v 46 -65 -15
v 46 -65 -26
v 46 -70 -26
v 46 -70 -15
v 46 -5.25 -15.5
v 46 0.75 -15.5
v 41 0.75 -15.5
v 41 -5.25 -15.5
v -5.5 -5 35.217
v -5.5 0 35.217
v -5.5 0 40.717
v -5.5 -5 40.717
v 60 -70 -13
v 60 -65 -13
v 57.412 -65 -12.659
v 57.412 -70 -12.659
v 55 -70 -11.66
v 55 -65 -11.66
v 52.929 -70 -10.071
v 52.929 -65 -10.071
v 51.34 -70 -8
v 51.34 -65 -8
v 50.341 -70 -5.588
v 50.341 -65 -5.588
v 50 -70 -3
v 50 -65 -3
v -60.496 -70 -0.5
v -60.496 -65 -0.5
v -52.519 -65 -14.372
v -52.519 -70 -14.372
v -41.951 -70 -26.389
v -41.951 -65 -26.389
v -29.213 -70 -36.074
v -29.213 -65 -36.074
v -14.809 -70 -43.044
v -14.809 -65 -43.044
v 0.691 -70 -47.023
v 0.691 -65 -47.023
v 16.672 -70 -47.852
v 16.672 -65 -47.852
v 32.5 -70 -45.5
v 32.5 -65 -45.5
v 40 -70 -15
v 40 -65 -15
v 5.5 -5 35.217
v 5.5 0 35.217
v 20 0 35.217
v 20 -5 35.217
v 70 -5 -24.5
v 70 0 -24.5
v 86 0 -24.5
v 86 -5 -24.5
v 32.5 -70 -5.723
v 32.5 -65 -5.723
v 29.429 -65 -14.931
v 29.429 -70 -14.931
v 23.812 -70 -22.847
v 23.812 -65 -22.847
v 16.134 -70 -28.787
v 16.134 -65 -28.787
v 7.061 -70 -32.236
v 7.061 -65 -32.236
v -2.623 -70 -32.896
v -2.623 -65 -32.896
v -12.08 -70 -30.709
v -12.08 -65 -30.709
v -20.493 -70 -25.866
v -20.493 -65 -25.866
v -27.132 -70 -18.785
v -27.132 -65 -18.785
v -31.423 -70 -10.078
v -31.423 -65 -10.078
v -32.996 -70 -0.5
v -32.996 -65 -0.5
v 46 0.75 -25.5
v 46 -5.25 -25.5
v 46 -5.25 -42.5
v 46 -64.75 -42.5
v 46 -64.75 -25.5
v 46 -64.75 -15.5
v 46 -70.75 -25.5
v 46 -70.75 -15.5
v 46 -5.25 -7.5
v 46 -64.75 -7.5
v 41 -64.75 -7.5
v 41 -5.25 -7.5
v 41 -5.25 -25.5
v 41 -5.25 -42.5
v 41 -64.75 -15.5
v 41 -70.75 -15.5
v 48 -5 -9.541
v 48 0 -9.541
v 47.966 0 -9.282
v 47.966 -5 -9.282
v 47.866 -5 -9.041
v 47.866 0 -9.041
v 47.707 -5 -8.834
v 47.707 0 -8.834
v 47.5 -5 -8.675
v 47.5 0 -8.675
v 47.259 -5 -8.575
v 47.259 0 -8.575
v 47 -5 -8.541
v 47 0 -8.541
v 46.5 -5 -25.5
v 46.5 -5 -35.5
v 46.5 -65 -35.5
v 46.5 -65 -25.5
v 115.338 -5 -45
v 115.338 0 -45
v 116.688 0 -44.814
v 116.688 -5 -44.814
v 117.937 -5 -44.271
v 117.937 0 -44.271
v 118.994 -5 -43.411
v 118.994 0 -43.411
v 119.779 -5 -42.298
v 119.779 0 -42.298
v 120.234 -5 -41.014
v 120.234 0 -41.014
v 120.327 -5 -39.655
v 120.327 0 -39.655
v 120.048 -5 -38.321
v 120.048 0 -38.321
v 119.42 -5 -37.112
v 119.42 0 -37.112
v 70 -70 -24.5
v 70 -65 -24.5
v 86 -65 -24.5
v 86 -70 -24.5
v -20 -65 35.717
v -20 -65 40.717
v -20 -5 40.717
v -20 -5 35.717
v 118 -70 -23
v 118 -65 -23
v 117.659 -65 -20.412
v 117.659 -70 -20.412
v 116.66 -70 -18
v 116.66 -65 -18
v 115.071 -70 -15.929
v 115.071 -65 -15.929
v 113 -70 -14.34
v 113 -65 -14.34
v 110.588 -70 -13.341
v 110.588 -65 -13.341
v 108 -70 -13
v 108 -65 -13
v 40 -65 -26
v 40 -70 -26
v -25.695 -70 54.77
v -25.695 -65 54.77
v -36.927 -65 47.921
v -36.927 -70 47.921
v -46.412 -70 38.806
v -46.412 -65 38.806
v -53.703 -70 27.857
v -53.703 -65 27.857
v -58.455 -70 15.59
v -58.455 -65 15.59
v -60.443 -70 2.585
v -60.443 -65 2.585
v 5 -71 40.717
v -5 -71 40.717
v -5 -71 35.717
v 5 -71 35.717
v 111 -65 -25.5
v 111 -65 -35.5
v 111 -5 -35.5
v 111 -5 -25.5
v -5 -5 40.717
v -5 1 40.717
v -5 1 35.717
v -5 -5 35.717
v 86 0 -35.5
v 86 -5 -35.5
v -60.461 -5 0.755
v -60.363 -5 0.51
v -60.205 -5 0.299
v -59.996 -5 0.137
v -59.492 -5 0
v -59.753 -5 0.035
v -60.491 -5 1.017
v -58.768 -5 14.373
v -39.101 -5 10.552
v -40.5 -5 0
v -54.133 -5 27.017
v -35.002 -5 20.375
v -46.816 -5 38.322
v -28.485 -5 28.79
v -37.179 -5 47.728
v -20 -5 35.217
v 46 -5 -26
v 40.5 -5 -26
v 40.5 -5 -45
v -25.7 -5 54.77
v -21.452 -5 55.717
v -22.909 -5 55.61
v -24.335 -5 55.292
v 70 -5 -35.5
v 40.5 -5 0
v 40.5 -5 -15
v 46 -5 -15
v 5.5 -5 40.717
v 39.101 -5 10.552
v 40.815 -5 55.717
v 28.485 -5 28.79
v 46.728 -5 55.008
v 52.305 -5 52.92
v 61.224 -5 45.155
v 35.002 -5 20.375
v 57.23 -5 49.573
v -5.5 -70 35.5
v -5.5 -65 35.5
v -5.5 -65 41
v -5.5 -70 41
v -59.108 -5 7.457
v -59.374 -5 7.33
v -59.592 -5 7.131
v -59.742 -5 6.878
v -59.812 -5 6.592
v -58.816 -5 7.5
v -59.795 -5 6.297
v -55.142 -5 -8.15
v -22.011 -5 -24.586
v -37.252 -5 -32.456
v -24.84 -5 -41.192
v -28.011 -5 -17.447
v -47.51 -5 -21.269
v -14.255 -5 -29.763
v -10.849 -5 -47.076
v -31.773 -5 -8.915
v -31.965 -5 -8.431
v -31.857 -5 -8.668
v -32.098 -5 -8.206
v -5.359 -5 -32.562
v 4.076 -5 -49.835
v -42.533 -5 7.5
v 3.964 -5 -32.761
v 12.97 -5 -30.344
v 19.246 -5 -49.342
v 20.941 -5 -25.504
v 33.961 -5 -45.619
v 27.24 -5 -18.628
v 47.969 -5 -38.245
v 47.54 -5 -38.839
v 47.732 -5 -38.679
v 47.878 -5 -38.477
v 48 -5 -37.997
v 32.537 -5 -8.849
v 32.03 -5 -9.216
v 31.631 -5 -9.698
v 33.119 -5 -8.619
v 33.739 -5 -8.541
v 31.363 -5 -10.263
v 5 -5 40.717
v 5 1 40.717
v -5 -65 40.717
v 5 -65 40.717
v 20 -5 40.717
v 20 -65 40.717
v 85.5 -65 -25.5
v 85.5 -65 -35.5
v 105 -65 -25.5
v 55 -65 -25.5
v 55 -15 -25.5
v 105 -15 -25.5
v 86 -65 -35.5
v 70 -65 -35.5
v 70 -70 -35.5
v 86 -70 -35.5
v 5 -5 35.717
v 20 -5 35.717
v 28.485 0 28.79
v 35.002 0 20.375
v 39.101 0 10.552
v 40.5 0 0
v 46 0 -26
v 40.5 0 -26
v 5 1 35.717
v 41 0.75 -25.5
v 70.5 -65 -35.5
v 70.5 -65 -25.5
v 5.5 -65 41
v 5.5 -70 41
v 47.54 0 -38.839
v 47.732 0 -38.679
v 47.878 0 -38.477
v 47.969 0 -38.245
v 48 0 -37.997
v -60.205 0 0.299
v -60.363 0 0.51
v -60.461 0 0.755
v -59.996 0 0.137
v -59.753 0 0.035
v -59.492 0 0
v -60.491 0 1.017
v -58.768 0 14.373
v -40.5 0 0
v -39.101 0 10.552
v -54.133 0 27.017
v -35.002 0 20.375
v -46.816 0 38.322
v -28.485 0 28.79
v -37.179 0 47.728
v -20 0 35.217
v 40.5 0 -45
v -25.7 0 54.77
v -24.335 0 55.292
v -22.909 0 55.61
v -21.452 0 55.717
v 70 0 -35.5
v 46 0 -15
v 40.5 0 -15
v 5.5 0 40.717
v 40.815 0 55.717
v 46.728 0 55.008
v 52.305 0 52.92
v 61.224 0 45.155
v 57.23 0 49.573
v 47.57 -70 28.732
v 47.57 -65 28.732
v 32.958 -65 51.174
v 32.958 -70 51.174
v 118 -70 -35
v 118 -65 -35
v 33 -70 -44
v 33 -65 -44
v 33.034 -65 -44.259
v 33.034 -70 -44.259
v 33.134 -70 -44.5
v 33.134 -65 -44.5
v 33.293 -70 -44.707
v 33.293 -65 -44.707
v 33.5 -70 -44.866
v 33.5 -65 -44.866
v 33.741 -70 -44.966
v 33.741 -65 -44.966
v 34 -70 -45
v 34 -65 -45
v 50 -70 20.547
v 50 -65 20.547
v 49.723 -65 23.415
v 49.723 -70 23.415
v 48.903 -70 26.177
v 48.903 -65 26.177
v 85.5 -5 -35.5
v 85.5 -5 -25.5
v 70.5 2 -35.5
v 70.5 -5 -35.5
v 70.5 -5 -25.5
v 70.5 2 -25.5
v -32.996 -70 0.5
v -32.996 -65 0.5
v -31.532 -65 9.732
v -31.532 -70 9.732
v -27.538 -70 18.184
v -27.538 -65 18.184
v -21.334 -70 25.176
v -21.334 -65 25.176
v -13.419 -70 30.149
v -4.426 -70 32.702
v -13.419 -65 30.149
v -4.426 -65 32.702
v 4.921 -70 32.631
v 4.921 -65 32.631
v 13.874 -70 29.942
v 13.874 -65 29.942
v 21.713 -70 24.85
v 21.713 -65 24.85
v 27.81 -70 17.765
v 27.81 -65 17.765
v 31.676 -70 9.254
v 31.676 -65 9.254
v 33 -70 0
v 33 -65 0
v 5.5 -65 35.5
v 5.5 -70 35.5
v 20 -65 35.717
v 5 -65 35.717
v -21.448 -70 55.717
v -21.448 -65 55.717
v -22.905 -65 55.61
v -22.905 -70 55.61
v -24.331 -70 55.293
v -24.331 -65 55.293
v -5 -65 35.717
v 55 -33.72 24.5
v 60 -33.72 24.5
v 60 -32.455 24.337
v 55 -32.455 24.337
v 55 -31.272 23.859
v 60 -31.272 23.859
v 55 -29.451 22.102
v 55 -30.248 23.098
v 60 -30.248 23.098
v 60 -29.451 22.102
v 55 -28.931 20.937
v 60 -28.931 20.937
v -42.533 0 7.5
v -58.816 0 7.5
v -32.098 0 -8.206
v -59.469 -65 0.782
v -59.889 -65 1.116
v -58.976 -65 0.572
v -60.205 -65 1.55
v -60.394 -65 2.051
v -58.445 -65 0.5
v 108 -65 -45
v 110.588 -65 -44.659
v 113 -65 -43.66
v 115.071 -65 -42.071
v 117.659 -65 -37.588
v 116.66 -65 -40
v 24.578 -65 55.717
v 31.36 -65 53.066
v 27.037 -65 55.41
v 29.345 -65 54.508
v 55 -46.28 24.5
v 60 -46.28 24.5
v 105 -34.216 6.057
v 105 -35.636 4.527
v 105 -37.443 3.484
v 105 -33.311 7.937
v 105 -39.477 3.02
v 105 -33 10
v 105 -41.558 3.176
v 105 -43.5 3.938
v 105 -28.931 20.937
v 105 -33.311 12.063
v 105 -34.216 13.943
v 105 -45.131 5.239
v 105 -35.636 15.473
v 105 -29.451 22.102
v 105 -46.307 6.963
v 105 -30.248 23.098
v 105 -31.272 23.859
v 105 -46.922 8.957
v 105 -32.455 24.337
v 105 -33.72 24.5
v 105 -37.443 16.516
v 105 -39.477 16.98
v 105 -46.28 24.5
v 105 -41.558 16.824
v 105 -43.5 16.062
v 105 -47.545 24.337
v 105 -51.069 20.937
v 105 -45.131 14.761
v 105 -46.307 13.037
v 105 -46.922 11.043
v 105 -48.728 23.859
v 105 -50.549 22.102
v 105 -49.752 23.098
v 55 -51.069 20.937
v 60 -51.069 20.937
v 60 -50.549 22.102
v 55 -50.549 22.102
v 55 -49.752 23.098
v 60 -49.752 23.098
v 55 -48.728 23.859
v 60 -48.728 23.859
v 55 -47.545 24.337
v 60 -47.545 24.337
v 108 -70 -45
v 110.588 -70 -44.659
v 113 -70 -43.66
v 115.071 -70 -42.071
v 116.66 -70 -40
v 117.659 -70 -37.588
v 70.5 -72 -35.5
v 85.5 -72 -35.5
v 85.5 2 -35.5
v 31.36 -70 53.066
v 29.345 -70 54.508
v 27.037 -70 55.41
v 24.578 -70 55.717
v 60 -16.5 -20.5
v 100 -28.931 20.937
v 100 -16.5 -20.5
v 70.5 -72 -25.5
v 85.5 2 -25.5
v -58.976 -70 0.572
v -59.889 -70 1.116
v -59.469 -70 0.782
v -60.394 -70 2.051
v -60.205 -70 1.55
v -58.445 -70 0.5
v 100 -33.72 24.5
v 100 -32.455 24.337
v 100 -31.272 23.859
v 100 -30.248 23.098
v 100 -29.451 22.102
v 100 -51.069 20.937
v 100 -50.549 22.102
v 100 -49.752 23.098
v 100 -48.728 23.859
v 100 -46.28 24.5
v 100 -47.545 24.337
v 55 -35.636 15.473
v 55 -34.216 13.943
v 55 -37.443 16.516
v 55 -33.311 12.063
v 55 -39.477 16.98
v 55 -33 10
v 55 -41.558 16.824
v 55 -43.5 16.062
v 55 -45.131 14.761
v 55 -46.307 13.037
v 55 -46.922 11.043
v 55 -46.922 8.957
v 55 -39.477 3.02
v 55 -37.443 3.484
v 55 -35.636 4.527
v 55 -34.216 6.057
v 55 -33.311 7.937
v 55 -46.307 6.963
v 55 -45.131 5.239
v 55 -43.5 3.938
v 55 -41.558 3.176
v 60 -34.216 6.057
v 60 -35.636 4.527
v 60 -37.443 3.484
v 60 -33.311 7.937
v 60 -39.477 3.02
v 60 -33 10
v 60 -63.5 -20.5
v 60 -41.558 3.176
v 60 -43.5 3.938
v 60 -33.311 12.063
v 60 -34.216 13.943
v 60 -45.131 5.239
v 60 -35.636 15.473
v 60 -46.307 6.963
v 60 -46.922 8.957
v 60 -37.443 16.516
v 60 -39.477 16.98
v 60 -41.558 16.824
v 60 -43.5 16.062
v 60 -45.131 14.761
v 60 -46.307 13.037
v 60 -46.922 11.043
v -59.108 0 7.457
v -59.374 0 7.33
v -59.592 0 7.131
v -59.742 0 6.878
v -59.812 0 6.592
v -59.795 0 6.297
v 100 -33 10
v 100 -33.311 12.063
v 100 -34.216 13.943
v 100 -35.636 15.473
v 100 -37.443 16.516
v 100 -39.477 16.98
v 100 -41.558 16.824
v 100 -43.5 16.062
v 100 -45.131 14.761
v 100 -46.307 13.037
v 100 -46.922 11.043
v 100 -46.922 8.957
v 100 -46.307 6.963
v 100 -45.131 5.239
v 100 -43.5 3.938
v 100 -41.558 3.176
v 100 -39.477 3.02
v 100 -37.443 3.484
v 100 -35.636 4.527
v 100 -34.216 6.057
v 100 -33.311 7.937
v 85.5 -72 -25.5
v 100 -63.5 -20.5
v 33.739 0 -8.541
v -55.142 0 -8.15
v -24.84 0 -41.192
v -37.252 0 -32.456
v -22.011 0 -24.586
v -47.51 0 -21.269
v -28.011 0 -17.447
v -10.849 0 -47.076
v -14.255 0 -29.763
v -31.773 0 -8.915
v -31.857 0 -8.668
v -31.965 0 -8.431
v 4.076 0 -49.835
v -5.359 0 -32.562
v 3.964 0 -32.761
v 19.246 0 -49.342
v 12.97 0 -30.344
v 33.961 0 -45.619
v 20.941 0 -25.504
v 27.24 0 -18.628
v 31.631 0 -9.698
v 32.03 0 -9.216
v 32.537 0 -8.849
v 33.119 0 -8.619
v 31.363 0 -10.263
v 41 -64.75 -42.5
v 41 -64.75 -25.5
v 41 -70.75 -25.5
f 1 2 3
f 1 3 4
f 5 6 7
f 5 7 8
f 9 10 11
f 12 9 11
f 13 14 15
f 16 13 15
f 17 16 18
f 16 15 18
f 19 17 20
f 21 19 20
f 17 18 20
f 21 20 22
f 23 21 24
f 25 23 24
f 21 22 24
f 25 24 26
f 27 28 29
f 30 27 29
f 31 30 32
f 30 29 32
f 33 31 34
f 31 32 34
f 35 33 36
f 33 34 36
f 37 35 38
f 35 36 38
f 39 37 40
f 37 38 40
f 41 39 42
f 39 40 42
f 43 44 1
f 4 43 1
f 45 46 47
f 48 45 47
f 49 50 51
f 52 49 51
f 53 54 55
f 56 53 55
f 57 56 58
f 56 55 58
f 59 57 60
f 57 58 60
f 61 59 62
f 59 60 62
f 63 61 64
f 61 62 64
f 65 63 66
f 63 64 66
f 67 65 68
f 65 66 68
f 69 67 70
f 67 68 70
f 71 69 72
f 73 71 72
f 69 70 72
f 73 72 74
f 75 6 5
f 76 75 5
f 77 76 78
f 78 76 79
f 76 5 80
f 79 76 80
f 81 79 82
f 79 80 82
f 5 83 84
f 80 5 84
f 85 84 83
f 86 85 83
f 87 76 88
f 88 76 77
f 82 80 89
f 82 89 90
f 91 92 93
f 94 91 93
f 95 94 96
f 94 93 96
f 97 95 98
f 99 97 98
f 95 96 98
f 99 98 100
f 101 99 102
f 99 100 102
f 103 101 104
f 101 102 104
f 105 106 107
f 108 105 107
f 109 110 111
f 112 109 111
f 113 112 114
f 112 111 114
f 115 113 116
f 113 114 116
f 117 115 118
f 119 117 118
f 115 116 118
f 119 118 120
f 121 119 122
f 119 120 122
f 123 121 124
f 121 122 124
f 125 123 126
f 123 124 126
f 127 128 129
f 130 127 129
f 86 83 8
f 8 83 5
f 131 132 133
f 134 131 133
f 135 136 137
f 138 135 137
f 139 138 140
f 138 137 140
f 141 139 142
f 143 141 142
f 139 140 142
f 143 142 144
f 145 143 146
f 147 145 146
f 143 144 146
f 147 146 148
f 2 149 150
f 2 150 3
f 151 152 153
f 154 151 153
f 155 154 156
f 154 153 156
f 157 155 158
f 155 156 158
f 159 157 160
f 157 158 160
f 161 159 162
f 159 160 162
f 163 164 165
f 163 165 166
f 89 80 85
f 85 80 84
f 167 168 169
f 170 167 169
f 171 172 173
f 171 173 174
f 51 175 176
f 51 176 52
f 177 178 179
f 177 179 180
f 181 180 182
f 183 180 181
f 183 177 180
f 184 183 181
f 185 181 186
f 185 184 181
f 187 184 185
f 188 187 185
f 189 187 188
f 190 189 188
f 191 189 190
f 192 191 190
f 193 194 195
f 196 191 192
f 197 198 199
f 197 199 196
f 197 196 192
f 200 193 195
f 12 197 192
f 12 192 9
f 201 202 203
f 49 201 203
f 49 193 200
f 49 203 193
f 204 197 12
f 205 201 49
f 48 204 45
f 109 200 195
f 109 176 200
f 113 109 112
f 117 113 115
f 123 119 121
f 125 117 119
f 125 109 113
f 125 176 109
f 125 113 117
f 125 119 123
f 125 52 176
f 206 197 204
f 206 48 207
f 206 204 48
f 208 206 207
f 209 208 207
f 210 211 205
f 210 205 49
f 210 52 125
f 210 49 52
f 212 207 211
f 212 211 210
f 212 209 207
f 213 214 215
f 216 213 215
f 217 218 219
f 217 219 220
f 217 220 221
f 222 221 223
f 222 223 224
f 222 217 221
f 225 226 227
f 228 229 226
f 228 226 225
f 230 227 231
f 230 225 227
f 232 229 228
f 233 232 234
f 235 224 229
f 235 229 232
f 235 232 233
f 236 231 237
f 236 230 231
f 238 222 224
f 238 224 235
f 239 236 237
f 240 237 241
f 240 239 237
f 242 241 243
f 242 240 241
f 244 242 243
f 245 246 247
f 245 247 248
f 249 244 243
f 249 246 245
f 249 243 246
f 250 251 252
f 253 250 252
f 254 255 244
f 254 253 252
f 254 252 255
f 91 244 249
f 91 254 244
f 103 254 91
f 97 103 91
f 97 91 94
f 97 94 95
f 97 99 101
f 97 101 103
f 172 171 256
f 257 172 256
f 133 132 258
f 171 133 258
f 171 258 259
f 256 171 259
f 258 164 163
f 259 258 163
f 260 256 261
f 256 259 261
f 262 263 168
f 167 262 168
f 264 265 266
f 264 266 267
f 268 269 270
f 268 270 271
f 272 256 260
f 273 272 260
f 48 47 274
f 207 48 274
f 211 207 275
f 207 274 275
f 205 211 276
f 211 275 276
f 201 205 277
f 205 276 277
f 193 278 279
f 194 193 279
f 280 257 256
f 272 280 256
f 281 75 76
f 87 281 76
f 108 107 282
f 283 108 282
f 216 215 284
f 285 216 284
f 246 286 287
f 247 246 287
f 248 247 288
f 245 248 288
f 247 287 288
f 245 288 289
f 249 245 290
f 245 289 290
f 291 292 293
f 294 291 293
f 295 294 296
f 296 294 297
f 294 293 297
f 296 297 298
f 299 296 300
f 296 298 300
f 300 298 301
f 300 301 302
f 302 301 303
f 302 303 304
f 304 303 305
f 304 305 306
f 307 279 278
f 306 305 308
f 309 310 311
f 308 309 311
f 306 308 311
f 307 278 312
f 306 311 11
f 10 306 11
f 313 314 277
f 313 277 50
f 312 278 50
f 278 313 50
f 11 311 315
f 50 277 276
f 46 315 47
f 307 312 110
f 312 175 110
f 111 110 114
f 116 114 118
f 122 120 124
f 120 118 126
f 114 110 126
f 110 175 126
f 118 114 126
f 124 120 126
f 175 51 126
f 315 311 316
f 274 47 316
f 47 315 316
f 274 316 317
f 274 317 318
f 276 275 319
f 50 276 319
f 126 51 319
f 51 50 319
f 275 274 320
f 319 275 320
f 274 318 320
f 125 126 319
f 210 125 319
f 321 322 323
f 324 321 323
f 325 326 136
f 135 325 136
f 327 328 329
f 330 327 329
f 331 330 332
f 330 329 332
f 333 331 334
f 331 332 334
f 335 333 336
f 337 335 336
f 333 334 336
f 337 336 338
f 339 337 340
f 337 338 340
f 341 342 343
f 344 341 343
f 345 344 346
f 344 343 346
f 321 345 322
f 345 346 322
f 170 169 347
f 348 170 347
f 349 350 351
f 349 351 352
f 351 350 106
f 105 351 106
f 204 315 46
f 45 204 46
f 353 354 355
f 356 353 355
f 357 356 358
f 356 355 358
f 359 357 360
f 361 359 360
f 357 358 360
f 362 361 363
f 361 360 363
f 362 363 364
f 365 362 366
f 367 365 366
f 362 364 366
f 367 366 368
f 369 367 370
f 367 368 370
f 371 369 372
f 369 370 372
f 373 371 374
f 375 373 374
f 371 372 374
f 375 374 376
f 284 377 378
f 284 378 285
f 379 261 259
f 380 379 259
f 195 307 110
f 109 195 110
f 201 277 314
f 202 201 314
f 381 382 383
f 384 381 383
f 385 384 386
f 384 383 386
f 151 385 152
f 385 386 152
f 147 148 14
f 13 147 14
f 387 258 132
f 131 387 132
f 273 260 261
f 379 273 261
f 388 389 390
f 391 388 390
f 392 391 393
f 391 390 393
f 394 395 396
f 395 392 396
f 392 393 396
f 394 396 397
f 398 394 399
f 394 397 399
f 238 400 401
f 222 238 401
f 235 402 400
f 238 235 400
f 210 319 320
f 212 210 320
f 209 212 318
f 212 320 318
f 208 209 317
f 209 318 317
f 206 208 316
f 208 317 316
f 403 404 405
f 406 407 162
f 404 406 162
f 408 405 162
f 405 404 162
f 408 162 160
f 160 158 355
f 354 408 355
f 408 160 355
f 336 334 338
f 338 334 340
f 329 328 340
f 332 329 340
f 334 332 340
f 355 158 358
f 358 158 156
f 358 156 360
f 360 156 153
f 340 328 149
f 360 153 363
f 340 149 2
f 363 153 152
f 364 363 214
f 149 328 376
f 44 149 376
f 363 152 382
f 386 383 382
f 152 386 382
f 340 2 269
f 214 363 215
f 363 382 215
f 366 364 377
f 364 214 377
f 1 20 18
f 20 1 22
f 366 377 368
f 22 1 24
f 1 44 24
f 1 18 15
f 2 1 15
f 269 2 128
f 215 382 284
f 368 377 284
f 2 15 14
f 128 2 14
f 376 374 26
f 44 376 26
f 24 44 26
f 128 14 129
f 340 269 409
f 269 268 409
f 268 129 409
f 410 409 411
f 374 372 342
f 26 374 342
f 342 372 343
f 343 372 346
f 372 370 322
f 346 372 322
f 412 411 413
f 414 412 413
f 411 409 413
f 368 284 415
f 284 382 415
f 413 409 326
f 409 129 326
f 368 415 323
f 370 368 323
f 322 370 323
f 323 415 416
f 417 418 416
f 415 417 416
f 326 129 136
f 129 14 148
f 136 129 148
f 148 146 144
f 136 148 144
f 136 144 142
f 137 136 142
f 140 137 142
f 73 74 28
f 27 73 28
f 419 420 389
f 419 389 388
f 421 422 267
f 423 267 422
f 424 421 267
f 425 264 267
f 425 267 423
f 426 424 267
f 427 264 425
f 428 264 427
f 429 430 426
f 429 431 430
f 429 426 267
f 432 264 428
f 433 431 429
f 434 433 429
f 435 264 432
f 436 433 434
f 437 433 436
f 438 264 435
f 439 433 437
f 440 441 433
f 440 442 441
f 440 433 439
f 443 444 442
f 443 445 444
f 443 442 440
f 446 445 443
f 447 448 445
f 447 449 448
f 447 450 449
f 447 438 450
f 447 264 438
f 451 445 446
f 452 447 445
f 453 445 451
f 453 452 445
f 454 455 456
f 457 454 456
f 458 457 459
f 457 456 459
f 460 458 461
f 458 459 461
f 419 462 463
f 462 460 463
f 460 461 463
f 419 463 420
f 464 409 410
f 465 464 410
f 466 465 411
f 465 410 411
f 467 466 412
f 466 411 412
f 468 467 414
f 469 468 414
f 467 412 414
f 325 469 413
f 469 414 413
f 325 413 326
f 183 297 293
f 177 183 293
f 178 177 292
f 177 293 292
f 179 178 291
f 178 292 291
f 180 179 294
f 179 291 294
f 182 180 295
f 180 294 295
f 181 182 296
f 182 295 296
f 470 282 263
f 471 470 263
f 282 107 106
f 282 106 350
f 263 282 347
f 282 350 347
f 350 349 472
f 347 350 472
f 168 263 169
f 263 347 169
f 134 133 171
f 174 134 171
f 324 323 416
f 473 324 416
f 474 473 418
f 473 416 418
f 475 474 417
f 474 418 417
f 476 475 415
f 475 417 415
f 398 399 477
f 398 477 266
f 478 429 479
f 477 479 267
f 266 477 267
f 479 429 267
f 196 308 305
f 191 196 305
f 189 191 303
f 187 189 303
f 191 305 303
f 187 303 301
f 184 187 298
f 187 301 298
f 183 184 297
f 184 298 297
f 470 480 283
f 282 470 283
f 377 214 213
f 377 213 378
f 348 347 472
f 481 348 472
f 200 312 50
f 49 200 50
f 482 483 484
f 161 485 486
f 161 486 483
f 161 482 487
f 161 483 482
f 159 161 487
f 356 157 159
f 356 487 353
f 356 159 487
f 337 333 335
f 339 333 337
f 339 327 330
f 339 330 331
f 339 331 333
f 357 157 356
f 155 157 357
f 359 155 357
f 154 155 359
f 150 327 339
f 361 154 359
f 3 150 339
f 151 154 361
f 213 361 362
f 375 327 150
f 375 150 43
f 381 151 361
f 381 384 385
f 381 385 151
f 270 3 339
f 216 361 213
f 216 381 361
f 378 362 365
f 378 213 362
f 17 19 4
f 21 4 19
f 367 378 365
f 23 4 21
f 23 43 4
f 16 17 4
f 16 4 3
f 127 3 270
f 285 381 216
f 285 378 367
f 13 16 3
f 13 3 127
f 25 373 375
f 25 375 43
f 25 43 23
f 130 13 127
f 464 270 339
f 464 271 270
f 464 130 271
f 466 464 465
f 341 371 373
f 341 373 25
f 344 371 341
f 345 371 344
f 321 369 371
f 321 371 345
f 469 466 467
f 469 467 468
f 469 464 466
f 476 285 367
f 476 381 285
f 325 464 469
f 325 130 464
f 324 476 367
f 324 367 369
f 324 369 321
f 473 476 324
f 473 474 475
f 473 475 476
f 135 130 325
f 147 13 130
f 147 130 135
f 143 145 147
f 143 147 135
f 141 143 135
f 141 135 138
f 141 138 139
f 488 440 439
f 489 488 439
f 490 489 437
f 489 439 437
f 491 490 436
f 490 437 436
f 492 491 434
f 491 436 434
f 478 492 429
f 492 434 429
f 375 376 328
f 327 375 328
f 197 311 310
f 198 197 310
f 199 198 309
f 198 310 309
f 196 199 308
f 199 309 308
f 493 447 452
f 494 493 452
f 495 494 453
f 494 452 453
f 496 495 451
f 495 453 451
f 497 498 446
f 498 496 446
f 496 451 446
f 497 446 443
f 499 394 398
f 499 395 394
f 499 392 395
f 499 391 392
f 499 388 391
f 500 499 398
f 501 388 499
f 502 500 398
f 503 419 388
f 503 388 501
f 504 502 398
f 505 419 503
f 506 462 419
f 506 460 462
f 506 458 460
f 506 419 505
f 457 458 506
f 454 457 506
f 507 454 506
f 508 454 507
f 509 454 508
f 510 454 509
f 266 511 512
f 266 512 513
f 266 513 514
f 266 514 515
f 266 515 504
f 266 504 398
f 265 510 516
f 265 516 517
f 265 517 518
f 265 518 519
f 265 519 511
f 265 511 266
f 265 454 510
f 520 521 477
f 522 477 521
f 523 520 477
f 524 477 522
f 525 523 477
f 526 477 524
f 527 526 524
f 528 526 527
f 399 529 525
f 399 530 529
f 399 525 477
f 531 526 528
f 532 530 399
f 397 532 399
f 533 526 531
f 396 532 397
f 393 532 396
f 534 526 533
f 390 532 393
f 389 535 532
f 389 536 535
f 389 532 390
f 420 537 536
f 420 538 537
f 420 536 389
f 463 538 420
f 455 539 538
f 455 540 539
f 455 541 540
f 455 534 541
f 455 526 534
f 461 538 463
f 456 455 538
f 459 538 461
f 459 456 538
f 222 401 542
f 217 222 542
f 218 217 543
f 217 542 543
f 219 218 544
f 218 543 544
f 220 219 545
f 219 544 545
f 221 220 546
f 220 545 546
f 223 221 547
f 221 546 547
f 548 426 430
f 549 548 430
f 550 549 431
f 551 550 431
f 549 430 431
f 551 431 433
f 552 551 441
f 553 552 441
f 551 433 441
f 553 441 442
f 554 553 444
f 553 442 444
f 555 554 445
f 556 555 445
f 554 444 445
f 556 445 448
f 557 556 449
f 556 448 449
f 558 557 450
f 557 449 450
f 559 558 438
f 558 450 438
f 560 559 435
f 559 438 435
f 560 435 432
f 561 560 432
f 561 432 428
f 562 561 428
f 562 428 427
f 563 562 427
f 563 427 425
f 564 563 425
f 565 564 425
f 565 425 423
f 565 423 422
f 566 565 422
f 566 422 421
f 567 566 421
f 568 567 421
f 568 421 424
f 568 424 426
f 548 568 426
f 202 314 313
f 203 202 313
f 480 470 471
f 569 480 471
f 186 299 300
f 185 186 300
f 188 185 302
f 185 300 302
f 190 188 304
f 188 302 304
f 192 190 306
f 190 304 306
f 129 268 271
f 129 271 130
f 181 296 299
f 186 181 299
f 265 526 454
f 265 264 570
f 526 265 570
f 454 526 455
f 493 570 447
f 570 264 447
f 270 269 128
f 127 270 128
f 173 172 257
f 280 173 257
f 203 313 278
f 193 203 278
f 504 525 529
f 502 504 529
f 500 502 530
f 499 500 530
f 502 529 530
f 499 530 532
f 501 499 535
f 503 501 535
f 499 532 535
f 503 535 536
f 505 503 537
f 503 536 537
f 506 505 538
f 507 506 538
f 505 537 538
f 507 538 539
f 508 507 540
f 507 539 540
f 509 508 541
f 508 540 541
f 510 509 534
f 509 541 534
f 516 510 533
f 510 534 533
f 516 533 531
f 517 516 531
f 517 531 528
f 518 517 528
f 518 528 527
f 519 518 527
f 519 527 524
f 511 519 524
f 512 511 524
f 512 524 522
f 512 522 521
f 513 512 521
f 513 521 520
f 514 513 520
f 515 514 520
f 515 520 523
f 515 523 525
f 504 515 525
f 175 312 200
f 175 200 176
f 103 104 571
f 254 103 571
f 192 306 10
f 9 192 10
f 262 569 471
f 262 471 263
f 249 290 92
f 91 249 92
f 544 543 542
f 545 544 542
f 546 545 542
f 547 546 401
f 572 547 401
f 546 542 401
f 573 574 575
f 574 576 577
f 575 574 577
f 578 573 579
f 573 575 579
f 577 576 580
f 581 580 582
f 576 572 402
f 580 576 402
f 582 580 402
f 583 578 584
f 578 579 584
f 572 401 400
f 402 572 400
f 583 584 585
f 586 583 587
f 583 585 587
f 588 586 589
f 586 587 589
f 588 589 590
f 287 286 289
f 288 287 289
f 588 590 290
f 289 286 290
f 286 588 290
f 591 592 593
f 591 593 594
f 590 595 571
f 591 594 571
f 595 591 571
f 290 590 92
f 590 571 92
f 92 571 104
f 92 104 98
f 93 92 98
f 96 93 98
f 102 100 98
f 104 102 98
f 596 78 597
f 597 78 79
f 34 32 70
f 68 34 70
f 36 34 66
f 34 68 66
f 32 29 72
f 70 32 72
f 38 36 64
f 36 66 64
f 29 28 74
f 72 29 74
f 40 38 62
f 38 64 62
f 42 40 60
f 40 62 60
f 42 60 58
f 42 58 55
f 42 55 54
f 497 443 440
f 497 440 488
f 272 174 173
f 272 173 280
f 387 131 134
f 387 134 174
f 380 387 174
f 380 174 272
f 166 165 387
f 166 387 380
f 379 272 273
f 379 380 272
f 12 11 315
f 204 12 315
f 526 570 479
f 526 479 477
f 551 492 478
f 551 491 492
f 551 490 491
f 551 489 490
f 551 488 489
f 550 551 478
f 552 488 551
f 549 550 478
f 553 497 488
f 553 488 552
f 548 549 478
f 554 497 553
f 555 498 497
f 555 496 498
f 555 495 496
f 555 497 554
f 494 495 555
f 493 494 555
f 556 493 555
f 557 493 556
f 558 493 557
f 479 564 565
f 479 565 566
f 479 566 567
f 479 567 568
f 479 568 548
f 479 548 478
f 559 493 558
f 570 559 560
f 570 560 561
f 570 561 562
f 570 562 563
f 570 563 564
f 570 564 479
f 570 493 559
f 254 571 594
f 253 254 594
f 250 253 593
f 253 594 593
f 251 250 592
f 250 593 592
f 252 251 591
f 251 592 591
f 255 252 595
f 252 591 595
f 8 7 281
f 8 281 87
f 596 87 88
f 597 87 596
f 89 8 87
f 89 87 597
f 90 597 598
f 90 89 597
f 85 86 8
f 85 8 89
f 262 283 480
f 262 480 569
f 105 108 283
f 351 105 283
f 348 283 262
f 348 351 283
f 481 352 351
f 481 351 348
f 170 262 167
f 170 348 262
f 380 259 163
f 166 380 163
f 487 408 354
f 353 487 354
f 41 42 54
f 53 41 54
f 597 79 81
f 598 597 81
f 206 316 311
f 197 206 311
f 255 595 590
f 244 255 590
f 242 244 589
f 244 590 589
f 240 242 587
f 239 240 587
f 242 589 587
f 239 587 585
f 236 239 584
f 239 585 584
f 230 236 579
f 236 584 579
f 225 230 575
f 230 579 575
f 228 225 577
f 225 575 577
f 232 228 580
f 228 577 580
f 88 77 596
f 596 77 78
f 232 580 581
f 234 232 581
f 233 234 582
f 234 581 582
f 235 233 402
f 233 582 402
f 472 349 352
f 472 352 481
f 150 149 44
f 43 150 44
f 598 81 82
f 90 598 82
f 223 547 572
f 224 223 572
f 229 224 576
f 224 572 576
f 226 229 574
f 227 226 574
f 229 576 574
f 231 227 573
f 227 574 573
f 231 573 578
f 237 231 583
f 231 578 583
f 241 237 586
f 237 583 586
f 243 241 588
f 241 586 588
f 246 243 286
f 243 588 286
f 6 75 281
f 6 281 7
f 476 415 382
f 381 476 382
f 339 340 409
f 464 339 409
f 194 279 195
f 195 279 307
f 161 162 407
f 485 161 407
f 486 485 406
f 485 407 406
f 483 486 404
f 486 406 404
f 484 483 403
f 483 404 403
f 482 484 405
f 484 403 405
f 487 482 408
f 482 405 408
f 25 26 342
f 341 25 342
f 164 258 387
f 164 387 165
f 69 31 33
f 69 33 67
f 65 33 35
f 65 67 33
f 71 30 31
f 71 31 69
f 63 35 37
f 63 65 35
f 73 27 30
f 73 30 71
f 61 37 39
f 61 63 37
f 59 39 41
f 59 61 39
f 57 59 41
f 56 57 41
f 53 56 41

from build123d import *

# Parameters (mm, degrees)
F0_W      = 16
F0_H      = 11
F1_DEPTH  = 5
F3_DEPTH  = 5
F4_W      = 15
F4_H      = 7
F5_DEPTH  = 10
F7_DEPTH  = 50
F8_R      = 7
F9_DEPTH  = 602
F10_W     = 16
F10_H     = 11
F10_W_2   = 6
F10_W_3   = 11
F10_H_2   = 5.5
F11_DEPTH = 5
F12_W     = 10
F12_H     = 6
F13_DEPTH = 5
F14_W     = 6
F14_H     = 10
F15_DEPTH = 5


with BuildPart() as f1:
    # F0 (on Front) → F1 (new body)
    with BuildSketch(Plane.XZ):
        with BuildLine():
            ThreePointArc((-40.5, 0), (-35.0017856687, 20.3746165608), (-20, 35.2171833059))
            Line((-20, 35.2171833059), (-5.5, 35.2171833059))
            Line((-5.5, 35.2171833059), (-5.5, 40.7171833059))
            Line((-5.5, 40.7171833059), (5.5, 40.7171833059))
            Line((5.5, 40.7171833059), (5.5, 35.2171833059))
            Line((5.5, 35.2171833059), (20, 35.2171833059))
            ThreePointArc((20, 35.2171833059), (35.0017856687, 20.3746165608), (40.5, 0))
            Line((40.5, 0), (40.5, -15))
            Line((40.5, -15), (46, -15))
            Line((46, -15), (46, -26))
            Line((46, -26), (40.5, -26))
            Line((40.5, -26), (40.5, -45))
            Line((40.5, -45), (115.3384250636, -45))
            ThreePointArc((115.3384250636, -45), (119.7790192257, -42.2980695132), (119.4203426893, -37.1124493949))
            Line((119.4203426893, -37.1124493949), (61.2243521745, 45.1549363311))
            ThreePointArc((61.2243521745, 45.1549363311), (52.3051116117, 52.9201541165), (40.8147640458, 55.7171833059))
            Line((40.8147640458, 55.7171833059), (-21.4520197319, 55.7171833059))
            ThreePointArc((-21.4520197319, 55.7171833059), (-23.6281314187, 55.477538726), (-25.6999444312, 54.7700908912))
            ThreePointArc((-25.6999444312, 54.7700908912), (-50.7896959548, 32.8733445944), (-60.4914548022, 1.0168067227))
            ThreePointArc((-60.4914548022, 1.0168067227), (-60.2046201411, 0.2988604713), (-59.4915960452, 0))
            Line((-59.4915960452, 0), (-40.5, 0))
        make_face()
        with Locations((78, -30)):
            Rectangle(F0_W, F0_H, mode=Mode.SUBTRACT)
    extrude(amount=F1_DEPTH)


with BuildPart() as f3:
    # F2 (on Front) → F3 (new body)
    with BuildSketch(Plane.XZ):
        with BuildLine():
            ThreePointArc((31.3633663202, -10.2634912709), (-0.7048926371, -32.9924707527), (-31.7731104155, -8.9145641802))
            ThreePointArc((-31.7731104155, -8.9145641802), (-31.9077359339, -8.5477633127), (-32.0978693881, -8.2064186537))
            Line((-32.0978693881, -8.2064186537), (-42.5333240792, 7.5))
            Line((-42.5333240792, 7.5), (-58.8162039998, 7.5))
            ThreePointArc((-58.8162039998, 7.5), (-59.5916175254, 7.1314537705), (-59.7954795887, 6.2974677287))
            ThreePointArc((-59.7954795887, 6.2974677287), (-18.0031476506, -44.5111244838), (47.5402409783, -38.8387124322))
            ThreePointArc((47.5402409783, -38.8387124322), (47.8775650911, -38.4766595898), (48, -37.9972020725))
            Line((48, -37.9972020725), (48, -9.5410284884))
            ThreePointArc((48, -9.5410284884), (47.7071067812, -8.8339217072), (47, -8.5410284884))
            Line((47, -8.5410284884), (33.7393789202, -8.5410284884))
            ThreePointArc((33.7393789202, -8.5410284884), (32.2720417135, -9.016943134), (31.3633663202, -10.2634912709))
        make_face()
    extrude(amount=F3_DEPTH)


with BuildPart() as f5:
    # F4 (on face) → F5 (new body)
    with BuildSketch(Plane.XY.offset(-35.5)):
        Polygon((70.5, -5), (46.5, -5), (46.5, -65), (70.5, -65), (85.5, -65), (111, -65), (111, -5), (85.5, -5), align=None)
        with Locations((78, -1.5)):
            Rectangle(F4_W, F4_H)
        with Locations((78, -68.5)):
            Rectangle(F4_W, F4_H)
    extrude(amount=F5_DEPTH)


with BuildPart() as f7:
    # F6 (on face) → F7 (new body)
    with BuildSketch(Plane.XZ.offset(65)):
        Polygon((60, -20.5), (60, 24.5), (55, 24.5), (55, -25.5), (105, -25.5), (105, 24.5), (100, 24.5), (100, -20.5), align=None)
    extrude(amount=-F7_DEPTH)

    # F8 (on face) → F9 (cut)
    with BuildSketch(Plane.YZ.offset(105)):
        with Locations((-40, 10)):
            Circle(F8_R)
        with BuildLine():
            Line((-15, 24.5), (-33.7201532545, 24.5))
            ThreePointArc((-33.7201532545, 24.5), (-30.7355006063, 23.5114646414), (-28.9310218283, 20.9367394278))
            Line((-28.9310218283, 20.9367394278), (-15, -25.5))
            Line((-15, -25.5), (-15, 24.5))
        make_face()
        with BuildLine():
            ThreePointArc((-51.0689781717, 20.9367394278), (-49.2644993937, 23.5114646414), (-46.2798467455, 24.5))
            Line((-46.2798467455, 24.5), (-65, 24.5))
            Line((-65, 24.5), (-65, -25.5))
            Line((-65, -25.5), (-51.0689781717, 20.9367394278))
        make_face()
    extrude(amount=-F9_DEPTH, mode=Mode.SUBTRACT)


with BuildPart() as f11:
    # F10 (on face) → F11 (new body)
    with BuildSketch(Plane.XZ.offset(65)):
        with BuildLine():
            ThreePointArc((-32.9962119038, 0.5), (0.2500071747, 32.9990529624), (33, 0))
            Line((33, 0), (33, -44))
            ThreePointArc((33, -44), (33.2928932188, -44.7071067812), (34, -45))
            Line((34, -45), (108, -45))
            ThreePointArc((108, -45), (115.0710678119, -42.0710678119), (118, -35))
            Line((118, -35), (118, -23))
            ThreePointArc((118, -23), (115.0710678119, -15.9289321881), (108, -13))
            Line((108, -13), (60, -13))
            ThreePointArc((60, -13), (52.9289321881, -10.0710678119), (50, -3))
            Line((50, -3), (50, 0.018009717))
            Line((50, 0.018009717), (50, 20.5470842988))
            ThreePointArc((50, 20.5470842988), (49.3797577347, 24.8158742319), (47.5703243343, 28.7316396398))
            Line((47.5703243343, 28.7316396398), (32.9583635501, 51.1735535332))
            ThreePointArc((32.9583635501, 51.1735535332), (29.3445032584, 54.5081929826), (24.5781473272, 55.7171833059))
            Line((24.5781473272, 55.7171833059), (-21.4479659412, 55.7171833059))
            ThreePointArc((-21.4479659412, 55.7171833059), (-23.6237229696, 55.4776177918), (-25.6952327278, 54.7703995766))
            ThreePointArc((-25.6952327278, 54.7703995766), (-50.3563868625, 33.5302245275), (-60.4430060978, 2.5854726013))
            ThreePointArc((-60.4430060978, 2.5854726013), (-59.8889498708, 1.116335518), (-58.4448333239, 0.5))
            Line((-58.4448333239, 0.5), (-32.9962119038, 0.5))
        make_face()
        with Locations((78, -30)):
            Rectangle(F10_W, F10_H, mode=Mode.SUBTRACT)
        with Locations((43, -20.5)):
            Rectangle(F10_W_2, F10_H, mode=Mode.SUBTRACT)
        with Locations((0, 38.25)):
            Rectangle(F10_W_3, F10_H_2, mode=Mode.SUBTRACT)
    extrude(amount=F11_DEPTH)


with BuildPart() as f11b:
    # F10 (on face) → F11, piece 2 (new body)
    with BuildSketch(Plane.XZ.offset(65)):
        with BuildLine():
            ThreePointArc((32.5, -5.7227615711), (-2.6231405167, -32.8955792445), (-32.9962119038, -0.5))
            Line((-32.9962119038, -0.5), (-60.4962119038, -0.5))
            ThreePointArc((-60.4962119038, -0.5), (-22.1847321825, -39.9183383937), (32.5, -45.5))
            Line((32.5, -45.5), (32.5, -5.7227615711))
        make_face()
    extrude(amount=F11_DEPTH)


with BuildPart() as f13:
    # F12 (on face) → F13 (new body)
    with BuildSketch(Plane(origin=(0, 0, 40.7171833059), x_dir=(1, 0, 0), z_dir=(0, 0, -1))):
        Polygon((-20, 65), (-20, 5), (-5, 5), (5, 5), (20, 5), (20, 65), (5, 65), (-5, 65), align=None)
        with Locations((0, 2)):
            Rectangle(F12_W, F12_H)
        with Locations((0, 68)):
            Rectangle(F12_W, F12_H)
    extrude(amount=F13_DEPTH)


with BuildPart() as f15:
    # F14 (on face) → F15 (new body)
    with BuildSketch(Plane(origin=(46, 0, 0), x_dir=(0, -1, 0), z_dir=(-1, 0, 0))):
        Polygon((64.75, -7.5), (5.25, -7.5), (5.25, -15.5), (5.25, -25.5), (5.25, -42.5), (64.75, -42.5), (64.75, -26), (64.75, -25.5), (64.75, -15.5), align=None)
        with Locations((2.25, -20.5)):
            Rectangle(F14_W, F14_H)
        with Locations((67.75, -20.5)):
            Rectangle(F14_W, F14_H)
    extrude(amount=F15_DEPTH)


solid = Compound([f1.part, f3.part, f5.part, f7.part, f11.part, f11b.part, f13.part, f15.part])
